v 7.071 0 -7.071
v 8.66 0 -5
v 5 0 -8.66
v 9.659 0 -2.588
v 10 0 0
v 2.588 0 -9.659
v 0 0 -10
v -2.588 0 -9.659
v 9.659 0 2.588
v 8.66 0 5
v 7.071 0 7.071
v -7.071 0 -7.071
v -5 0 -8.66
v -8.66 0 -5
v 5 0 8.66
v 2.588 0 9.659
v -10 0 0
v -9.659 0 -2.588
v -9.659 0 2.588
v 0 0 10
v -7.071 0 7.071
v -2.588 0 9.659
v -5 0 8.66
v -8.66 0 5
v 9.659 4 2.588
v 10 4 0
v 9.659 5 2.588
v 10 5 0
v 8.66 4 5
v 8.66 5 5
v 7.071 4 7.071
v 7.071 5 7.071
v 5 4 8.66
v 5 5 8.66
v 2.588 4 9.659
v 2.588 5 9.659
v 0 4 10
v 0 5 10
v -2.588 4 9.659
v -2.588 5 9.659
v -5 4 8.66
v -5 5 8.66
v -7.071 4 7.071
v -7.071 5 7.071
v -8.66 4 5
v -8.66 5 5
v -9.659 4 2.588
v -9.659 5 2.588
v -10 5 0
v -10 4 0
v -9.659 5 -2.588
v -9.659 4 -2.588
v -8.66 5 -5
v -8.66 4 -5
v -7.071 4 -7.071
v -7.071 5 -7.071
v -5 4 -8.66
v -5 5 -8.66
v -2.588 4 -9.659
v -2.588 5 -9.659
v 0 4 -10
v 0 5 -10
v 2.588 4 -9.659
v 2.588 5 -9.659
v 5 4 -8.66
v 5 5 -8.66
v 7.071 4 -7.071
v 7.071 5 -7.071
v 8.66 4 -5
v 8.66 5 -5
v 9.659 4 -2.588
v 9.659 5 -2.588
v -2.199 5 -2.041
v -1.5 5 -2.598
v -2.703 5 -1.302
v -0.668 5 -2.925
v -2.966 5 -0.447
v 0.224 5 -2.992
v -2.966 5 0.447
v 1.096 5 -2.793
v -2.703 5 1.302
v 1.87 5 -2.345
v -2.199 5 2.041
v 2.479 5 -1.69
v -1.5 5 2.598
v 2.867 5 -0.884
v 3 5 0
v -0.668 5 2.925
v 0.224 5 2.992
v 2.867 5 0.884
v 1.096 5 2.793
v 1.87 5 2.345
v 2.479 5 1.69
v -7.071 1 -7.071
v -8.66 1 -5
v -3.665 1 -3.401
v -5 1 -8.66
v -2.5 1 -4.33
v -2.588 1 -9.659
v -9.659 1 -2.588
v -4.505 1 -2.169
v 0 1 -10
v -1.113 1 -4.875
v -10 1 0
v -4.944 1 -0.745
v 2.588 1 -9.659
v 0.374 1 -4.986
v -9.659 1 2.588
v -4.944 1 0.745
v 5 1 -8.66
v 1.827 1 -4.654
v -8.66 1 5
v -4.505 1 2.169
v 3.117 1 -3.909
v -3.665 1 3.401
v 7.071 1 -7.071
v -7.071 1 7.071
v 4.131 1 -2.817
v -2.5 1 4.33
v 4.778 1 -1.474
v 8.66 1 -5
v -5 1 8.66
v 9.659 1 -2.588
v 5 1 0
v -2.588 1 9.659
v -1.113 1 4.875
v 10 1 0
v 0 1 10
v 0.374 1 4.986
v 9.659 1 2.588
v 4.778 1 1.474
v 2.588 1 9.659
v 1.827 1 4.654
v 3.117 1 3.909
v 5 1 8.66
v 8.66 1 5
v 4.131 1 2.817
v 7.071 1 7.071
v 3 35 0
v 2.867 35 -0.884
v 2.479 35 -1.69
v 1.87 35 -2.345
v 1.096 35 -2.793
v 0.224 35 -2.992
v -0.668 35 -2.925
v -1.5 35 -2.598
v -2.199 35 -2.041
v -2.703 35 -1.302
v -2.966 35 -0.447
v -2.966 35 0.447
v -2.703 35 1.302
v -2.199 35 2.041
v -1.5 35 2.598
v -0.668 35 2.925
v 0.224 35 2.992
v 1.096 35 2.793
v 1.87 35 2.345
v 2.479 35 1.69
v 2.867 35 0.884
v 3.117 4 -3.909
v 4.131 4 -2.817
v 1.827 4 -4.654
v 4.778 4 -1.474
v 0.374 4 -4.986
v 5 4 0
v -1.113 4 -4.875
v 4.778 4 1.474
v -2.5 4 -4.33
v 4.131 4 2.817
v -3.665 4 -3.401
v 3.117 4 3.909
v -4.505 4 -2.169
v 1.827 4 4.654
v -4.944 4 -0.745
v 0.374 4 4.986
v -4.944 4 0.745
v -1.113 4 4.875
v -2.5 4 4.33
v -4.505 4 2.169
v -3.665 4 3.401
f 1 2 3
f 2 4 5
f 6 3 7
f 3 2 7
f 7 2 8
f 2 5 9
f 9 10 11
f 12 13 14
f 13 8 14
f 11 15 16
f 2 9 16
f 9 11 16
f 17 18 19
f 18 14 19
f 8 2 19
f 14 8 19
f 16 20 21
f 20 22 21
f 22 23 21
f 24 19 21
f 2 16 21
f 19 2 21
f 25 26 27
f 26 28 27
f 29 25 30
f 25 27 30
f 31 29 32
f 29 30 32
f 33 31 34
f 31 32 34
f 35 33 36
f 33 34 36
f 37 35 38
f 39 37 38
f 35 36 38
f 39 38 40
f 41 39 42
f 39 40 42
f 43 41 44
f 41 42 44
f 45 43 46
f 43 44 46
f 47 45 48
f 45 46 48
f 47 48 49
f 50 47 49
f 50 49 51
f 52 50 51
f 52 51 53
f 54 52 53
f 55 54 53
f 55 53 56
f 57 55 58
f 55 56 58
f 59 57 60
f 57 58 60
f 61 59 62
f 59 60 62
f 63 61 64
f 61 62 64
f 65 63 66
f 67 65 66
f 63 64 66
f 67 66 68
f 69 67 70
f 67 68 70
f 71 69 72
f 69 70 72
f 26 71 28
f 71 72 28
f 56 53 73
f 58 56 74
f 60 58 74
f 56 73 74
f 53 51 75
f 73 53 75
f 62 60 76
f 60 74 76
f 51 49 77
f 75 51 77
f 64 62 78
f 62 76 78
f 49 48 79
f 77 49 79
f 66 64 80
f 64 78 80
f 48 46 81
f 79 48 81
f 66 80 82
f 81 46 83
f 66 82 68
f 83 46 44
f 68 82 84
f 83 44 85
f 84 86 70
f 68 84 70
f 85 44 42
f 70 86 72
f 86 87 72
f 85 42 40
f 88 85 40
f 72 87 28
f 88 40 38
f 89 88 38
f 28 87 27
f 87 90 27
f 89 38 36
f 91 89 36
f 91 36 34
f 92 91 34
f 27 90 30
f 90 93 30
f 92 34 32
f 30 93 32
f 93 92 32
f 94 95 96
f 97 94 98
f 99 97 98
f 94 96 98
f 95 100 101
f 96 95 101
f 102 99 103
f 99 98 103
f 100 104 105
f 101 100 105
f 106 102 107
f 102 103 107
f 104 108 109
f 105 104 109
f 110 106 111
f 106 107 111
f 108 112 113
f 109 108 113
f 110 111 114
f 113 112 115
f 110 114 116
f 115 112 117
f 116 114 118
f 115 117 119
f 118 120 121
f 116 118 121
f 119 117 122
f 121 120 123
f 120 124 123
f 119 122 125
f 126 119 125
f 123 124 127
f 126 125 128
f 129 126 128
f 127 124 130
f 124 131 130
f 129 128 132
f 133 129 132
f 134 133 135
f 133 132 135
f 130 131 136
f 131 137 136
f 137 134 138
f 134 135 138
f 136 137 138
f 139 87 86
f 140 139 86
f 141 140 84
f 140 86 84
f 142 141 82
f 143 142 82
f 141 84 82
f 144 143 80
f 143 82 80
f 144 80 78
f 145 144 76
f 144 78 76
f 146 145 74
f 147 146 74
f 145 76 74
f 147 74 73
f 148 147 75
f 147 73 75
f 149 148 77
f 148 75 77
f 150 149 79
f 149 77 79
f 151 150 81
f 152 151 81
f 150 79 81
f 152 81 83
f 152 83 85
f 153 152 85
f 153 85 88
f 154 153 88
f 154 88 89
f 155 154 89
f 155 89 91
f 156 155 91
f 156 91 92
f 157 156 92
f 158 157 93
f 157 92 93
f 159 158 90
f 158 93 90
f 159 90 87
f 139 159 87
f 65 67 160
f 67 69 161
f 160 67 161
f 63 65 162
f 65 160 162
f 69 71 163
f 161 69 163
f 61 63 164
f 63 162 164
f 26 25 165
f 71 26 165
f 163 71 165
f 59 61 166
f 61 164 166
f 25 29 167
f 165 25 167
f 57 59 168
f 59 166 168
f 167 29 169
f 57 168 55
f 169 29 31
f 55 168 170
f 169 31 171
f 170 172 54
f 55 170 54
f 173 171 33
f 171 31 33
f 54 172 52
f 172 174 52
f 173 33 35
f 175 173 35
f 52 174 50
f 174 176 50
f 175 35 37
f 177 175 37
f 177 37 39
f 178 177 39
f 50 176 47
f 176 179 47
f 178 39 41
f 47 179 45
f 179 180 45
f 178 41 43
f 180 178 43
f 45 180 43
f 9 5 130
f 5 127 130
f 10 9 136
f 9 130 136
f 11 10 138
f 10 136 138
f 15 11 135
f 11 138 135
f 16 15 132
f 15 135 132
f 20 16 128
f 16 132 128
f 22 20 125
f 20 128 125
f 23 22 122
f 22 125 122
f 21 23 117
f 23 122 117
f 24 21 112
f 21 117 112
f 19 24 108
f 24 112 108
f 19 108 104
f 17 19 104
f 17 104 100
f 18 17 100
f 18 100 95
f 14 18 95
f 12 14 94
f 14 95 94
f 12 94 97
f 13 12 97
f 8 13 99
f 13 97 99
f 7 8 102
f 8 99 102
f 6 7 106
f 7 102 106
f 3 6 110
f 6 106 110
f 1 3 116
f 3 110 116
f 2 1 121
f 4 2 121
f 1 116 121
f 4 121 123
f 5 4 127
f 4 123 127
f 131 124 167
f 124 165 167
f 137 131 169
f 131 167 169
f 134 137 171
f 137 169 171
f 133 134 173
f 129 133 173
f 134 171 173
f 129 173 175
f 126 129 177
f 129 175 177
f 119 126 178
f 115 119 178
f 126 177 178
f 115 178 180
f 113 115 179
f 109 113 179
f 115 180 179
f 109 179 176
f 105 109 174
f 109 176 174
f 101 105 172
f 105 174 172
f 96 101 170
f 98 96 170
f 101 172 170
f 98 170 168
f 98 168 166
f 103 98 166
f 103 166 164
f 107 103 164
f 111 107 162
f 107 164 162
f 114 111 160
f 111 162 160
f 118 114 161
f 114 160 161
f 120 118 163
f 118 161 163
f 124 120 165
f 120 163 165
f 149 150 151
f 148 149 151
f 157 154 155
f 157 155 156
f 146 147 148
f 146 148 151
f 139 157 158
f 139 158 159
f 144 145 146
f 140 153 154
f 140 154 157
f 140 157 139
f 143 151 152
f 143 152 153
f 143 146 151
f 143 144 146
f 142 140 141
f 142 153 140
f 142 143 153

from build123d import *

# Parameters (mm, degrees)
SKETCH2_R           = 3
BOSS_EXTRUDE1_DEPTH = 30


with BuildPart() as part:
    # Sketch1 → Revolve1 (revolve)
    with BuildSketch(Plane.XY):
        Polygon((0, 0), (10, 0), (10, 1), (5, 1), (5, 4), (10, 4), (10, 5), (0, 5), align=None)
    revolve(axis=Axis((0, 5, 0), (0, -1, 0)))

    # Sketch2 → Boss-Extrude1 (add)
    with BuildSketch(Plane(origin=(0, 5, 0), x_dir=(1, 0, 0), z_dir=(0, 1, 0))):
        Circle(SKETCH2_R)
    extrude(amount=BOSS_EXTRUDE1_DEPTH)


solid = part.part
